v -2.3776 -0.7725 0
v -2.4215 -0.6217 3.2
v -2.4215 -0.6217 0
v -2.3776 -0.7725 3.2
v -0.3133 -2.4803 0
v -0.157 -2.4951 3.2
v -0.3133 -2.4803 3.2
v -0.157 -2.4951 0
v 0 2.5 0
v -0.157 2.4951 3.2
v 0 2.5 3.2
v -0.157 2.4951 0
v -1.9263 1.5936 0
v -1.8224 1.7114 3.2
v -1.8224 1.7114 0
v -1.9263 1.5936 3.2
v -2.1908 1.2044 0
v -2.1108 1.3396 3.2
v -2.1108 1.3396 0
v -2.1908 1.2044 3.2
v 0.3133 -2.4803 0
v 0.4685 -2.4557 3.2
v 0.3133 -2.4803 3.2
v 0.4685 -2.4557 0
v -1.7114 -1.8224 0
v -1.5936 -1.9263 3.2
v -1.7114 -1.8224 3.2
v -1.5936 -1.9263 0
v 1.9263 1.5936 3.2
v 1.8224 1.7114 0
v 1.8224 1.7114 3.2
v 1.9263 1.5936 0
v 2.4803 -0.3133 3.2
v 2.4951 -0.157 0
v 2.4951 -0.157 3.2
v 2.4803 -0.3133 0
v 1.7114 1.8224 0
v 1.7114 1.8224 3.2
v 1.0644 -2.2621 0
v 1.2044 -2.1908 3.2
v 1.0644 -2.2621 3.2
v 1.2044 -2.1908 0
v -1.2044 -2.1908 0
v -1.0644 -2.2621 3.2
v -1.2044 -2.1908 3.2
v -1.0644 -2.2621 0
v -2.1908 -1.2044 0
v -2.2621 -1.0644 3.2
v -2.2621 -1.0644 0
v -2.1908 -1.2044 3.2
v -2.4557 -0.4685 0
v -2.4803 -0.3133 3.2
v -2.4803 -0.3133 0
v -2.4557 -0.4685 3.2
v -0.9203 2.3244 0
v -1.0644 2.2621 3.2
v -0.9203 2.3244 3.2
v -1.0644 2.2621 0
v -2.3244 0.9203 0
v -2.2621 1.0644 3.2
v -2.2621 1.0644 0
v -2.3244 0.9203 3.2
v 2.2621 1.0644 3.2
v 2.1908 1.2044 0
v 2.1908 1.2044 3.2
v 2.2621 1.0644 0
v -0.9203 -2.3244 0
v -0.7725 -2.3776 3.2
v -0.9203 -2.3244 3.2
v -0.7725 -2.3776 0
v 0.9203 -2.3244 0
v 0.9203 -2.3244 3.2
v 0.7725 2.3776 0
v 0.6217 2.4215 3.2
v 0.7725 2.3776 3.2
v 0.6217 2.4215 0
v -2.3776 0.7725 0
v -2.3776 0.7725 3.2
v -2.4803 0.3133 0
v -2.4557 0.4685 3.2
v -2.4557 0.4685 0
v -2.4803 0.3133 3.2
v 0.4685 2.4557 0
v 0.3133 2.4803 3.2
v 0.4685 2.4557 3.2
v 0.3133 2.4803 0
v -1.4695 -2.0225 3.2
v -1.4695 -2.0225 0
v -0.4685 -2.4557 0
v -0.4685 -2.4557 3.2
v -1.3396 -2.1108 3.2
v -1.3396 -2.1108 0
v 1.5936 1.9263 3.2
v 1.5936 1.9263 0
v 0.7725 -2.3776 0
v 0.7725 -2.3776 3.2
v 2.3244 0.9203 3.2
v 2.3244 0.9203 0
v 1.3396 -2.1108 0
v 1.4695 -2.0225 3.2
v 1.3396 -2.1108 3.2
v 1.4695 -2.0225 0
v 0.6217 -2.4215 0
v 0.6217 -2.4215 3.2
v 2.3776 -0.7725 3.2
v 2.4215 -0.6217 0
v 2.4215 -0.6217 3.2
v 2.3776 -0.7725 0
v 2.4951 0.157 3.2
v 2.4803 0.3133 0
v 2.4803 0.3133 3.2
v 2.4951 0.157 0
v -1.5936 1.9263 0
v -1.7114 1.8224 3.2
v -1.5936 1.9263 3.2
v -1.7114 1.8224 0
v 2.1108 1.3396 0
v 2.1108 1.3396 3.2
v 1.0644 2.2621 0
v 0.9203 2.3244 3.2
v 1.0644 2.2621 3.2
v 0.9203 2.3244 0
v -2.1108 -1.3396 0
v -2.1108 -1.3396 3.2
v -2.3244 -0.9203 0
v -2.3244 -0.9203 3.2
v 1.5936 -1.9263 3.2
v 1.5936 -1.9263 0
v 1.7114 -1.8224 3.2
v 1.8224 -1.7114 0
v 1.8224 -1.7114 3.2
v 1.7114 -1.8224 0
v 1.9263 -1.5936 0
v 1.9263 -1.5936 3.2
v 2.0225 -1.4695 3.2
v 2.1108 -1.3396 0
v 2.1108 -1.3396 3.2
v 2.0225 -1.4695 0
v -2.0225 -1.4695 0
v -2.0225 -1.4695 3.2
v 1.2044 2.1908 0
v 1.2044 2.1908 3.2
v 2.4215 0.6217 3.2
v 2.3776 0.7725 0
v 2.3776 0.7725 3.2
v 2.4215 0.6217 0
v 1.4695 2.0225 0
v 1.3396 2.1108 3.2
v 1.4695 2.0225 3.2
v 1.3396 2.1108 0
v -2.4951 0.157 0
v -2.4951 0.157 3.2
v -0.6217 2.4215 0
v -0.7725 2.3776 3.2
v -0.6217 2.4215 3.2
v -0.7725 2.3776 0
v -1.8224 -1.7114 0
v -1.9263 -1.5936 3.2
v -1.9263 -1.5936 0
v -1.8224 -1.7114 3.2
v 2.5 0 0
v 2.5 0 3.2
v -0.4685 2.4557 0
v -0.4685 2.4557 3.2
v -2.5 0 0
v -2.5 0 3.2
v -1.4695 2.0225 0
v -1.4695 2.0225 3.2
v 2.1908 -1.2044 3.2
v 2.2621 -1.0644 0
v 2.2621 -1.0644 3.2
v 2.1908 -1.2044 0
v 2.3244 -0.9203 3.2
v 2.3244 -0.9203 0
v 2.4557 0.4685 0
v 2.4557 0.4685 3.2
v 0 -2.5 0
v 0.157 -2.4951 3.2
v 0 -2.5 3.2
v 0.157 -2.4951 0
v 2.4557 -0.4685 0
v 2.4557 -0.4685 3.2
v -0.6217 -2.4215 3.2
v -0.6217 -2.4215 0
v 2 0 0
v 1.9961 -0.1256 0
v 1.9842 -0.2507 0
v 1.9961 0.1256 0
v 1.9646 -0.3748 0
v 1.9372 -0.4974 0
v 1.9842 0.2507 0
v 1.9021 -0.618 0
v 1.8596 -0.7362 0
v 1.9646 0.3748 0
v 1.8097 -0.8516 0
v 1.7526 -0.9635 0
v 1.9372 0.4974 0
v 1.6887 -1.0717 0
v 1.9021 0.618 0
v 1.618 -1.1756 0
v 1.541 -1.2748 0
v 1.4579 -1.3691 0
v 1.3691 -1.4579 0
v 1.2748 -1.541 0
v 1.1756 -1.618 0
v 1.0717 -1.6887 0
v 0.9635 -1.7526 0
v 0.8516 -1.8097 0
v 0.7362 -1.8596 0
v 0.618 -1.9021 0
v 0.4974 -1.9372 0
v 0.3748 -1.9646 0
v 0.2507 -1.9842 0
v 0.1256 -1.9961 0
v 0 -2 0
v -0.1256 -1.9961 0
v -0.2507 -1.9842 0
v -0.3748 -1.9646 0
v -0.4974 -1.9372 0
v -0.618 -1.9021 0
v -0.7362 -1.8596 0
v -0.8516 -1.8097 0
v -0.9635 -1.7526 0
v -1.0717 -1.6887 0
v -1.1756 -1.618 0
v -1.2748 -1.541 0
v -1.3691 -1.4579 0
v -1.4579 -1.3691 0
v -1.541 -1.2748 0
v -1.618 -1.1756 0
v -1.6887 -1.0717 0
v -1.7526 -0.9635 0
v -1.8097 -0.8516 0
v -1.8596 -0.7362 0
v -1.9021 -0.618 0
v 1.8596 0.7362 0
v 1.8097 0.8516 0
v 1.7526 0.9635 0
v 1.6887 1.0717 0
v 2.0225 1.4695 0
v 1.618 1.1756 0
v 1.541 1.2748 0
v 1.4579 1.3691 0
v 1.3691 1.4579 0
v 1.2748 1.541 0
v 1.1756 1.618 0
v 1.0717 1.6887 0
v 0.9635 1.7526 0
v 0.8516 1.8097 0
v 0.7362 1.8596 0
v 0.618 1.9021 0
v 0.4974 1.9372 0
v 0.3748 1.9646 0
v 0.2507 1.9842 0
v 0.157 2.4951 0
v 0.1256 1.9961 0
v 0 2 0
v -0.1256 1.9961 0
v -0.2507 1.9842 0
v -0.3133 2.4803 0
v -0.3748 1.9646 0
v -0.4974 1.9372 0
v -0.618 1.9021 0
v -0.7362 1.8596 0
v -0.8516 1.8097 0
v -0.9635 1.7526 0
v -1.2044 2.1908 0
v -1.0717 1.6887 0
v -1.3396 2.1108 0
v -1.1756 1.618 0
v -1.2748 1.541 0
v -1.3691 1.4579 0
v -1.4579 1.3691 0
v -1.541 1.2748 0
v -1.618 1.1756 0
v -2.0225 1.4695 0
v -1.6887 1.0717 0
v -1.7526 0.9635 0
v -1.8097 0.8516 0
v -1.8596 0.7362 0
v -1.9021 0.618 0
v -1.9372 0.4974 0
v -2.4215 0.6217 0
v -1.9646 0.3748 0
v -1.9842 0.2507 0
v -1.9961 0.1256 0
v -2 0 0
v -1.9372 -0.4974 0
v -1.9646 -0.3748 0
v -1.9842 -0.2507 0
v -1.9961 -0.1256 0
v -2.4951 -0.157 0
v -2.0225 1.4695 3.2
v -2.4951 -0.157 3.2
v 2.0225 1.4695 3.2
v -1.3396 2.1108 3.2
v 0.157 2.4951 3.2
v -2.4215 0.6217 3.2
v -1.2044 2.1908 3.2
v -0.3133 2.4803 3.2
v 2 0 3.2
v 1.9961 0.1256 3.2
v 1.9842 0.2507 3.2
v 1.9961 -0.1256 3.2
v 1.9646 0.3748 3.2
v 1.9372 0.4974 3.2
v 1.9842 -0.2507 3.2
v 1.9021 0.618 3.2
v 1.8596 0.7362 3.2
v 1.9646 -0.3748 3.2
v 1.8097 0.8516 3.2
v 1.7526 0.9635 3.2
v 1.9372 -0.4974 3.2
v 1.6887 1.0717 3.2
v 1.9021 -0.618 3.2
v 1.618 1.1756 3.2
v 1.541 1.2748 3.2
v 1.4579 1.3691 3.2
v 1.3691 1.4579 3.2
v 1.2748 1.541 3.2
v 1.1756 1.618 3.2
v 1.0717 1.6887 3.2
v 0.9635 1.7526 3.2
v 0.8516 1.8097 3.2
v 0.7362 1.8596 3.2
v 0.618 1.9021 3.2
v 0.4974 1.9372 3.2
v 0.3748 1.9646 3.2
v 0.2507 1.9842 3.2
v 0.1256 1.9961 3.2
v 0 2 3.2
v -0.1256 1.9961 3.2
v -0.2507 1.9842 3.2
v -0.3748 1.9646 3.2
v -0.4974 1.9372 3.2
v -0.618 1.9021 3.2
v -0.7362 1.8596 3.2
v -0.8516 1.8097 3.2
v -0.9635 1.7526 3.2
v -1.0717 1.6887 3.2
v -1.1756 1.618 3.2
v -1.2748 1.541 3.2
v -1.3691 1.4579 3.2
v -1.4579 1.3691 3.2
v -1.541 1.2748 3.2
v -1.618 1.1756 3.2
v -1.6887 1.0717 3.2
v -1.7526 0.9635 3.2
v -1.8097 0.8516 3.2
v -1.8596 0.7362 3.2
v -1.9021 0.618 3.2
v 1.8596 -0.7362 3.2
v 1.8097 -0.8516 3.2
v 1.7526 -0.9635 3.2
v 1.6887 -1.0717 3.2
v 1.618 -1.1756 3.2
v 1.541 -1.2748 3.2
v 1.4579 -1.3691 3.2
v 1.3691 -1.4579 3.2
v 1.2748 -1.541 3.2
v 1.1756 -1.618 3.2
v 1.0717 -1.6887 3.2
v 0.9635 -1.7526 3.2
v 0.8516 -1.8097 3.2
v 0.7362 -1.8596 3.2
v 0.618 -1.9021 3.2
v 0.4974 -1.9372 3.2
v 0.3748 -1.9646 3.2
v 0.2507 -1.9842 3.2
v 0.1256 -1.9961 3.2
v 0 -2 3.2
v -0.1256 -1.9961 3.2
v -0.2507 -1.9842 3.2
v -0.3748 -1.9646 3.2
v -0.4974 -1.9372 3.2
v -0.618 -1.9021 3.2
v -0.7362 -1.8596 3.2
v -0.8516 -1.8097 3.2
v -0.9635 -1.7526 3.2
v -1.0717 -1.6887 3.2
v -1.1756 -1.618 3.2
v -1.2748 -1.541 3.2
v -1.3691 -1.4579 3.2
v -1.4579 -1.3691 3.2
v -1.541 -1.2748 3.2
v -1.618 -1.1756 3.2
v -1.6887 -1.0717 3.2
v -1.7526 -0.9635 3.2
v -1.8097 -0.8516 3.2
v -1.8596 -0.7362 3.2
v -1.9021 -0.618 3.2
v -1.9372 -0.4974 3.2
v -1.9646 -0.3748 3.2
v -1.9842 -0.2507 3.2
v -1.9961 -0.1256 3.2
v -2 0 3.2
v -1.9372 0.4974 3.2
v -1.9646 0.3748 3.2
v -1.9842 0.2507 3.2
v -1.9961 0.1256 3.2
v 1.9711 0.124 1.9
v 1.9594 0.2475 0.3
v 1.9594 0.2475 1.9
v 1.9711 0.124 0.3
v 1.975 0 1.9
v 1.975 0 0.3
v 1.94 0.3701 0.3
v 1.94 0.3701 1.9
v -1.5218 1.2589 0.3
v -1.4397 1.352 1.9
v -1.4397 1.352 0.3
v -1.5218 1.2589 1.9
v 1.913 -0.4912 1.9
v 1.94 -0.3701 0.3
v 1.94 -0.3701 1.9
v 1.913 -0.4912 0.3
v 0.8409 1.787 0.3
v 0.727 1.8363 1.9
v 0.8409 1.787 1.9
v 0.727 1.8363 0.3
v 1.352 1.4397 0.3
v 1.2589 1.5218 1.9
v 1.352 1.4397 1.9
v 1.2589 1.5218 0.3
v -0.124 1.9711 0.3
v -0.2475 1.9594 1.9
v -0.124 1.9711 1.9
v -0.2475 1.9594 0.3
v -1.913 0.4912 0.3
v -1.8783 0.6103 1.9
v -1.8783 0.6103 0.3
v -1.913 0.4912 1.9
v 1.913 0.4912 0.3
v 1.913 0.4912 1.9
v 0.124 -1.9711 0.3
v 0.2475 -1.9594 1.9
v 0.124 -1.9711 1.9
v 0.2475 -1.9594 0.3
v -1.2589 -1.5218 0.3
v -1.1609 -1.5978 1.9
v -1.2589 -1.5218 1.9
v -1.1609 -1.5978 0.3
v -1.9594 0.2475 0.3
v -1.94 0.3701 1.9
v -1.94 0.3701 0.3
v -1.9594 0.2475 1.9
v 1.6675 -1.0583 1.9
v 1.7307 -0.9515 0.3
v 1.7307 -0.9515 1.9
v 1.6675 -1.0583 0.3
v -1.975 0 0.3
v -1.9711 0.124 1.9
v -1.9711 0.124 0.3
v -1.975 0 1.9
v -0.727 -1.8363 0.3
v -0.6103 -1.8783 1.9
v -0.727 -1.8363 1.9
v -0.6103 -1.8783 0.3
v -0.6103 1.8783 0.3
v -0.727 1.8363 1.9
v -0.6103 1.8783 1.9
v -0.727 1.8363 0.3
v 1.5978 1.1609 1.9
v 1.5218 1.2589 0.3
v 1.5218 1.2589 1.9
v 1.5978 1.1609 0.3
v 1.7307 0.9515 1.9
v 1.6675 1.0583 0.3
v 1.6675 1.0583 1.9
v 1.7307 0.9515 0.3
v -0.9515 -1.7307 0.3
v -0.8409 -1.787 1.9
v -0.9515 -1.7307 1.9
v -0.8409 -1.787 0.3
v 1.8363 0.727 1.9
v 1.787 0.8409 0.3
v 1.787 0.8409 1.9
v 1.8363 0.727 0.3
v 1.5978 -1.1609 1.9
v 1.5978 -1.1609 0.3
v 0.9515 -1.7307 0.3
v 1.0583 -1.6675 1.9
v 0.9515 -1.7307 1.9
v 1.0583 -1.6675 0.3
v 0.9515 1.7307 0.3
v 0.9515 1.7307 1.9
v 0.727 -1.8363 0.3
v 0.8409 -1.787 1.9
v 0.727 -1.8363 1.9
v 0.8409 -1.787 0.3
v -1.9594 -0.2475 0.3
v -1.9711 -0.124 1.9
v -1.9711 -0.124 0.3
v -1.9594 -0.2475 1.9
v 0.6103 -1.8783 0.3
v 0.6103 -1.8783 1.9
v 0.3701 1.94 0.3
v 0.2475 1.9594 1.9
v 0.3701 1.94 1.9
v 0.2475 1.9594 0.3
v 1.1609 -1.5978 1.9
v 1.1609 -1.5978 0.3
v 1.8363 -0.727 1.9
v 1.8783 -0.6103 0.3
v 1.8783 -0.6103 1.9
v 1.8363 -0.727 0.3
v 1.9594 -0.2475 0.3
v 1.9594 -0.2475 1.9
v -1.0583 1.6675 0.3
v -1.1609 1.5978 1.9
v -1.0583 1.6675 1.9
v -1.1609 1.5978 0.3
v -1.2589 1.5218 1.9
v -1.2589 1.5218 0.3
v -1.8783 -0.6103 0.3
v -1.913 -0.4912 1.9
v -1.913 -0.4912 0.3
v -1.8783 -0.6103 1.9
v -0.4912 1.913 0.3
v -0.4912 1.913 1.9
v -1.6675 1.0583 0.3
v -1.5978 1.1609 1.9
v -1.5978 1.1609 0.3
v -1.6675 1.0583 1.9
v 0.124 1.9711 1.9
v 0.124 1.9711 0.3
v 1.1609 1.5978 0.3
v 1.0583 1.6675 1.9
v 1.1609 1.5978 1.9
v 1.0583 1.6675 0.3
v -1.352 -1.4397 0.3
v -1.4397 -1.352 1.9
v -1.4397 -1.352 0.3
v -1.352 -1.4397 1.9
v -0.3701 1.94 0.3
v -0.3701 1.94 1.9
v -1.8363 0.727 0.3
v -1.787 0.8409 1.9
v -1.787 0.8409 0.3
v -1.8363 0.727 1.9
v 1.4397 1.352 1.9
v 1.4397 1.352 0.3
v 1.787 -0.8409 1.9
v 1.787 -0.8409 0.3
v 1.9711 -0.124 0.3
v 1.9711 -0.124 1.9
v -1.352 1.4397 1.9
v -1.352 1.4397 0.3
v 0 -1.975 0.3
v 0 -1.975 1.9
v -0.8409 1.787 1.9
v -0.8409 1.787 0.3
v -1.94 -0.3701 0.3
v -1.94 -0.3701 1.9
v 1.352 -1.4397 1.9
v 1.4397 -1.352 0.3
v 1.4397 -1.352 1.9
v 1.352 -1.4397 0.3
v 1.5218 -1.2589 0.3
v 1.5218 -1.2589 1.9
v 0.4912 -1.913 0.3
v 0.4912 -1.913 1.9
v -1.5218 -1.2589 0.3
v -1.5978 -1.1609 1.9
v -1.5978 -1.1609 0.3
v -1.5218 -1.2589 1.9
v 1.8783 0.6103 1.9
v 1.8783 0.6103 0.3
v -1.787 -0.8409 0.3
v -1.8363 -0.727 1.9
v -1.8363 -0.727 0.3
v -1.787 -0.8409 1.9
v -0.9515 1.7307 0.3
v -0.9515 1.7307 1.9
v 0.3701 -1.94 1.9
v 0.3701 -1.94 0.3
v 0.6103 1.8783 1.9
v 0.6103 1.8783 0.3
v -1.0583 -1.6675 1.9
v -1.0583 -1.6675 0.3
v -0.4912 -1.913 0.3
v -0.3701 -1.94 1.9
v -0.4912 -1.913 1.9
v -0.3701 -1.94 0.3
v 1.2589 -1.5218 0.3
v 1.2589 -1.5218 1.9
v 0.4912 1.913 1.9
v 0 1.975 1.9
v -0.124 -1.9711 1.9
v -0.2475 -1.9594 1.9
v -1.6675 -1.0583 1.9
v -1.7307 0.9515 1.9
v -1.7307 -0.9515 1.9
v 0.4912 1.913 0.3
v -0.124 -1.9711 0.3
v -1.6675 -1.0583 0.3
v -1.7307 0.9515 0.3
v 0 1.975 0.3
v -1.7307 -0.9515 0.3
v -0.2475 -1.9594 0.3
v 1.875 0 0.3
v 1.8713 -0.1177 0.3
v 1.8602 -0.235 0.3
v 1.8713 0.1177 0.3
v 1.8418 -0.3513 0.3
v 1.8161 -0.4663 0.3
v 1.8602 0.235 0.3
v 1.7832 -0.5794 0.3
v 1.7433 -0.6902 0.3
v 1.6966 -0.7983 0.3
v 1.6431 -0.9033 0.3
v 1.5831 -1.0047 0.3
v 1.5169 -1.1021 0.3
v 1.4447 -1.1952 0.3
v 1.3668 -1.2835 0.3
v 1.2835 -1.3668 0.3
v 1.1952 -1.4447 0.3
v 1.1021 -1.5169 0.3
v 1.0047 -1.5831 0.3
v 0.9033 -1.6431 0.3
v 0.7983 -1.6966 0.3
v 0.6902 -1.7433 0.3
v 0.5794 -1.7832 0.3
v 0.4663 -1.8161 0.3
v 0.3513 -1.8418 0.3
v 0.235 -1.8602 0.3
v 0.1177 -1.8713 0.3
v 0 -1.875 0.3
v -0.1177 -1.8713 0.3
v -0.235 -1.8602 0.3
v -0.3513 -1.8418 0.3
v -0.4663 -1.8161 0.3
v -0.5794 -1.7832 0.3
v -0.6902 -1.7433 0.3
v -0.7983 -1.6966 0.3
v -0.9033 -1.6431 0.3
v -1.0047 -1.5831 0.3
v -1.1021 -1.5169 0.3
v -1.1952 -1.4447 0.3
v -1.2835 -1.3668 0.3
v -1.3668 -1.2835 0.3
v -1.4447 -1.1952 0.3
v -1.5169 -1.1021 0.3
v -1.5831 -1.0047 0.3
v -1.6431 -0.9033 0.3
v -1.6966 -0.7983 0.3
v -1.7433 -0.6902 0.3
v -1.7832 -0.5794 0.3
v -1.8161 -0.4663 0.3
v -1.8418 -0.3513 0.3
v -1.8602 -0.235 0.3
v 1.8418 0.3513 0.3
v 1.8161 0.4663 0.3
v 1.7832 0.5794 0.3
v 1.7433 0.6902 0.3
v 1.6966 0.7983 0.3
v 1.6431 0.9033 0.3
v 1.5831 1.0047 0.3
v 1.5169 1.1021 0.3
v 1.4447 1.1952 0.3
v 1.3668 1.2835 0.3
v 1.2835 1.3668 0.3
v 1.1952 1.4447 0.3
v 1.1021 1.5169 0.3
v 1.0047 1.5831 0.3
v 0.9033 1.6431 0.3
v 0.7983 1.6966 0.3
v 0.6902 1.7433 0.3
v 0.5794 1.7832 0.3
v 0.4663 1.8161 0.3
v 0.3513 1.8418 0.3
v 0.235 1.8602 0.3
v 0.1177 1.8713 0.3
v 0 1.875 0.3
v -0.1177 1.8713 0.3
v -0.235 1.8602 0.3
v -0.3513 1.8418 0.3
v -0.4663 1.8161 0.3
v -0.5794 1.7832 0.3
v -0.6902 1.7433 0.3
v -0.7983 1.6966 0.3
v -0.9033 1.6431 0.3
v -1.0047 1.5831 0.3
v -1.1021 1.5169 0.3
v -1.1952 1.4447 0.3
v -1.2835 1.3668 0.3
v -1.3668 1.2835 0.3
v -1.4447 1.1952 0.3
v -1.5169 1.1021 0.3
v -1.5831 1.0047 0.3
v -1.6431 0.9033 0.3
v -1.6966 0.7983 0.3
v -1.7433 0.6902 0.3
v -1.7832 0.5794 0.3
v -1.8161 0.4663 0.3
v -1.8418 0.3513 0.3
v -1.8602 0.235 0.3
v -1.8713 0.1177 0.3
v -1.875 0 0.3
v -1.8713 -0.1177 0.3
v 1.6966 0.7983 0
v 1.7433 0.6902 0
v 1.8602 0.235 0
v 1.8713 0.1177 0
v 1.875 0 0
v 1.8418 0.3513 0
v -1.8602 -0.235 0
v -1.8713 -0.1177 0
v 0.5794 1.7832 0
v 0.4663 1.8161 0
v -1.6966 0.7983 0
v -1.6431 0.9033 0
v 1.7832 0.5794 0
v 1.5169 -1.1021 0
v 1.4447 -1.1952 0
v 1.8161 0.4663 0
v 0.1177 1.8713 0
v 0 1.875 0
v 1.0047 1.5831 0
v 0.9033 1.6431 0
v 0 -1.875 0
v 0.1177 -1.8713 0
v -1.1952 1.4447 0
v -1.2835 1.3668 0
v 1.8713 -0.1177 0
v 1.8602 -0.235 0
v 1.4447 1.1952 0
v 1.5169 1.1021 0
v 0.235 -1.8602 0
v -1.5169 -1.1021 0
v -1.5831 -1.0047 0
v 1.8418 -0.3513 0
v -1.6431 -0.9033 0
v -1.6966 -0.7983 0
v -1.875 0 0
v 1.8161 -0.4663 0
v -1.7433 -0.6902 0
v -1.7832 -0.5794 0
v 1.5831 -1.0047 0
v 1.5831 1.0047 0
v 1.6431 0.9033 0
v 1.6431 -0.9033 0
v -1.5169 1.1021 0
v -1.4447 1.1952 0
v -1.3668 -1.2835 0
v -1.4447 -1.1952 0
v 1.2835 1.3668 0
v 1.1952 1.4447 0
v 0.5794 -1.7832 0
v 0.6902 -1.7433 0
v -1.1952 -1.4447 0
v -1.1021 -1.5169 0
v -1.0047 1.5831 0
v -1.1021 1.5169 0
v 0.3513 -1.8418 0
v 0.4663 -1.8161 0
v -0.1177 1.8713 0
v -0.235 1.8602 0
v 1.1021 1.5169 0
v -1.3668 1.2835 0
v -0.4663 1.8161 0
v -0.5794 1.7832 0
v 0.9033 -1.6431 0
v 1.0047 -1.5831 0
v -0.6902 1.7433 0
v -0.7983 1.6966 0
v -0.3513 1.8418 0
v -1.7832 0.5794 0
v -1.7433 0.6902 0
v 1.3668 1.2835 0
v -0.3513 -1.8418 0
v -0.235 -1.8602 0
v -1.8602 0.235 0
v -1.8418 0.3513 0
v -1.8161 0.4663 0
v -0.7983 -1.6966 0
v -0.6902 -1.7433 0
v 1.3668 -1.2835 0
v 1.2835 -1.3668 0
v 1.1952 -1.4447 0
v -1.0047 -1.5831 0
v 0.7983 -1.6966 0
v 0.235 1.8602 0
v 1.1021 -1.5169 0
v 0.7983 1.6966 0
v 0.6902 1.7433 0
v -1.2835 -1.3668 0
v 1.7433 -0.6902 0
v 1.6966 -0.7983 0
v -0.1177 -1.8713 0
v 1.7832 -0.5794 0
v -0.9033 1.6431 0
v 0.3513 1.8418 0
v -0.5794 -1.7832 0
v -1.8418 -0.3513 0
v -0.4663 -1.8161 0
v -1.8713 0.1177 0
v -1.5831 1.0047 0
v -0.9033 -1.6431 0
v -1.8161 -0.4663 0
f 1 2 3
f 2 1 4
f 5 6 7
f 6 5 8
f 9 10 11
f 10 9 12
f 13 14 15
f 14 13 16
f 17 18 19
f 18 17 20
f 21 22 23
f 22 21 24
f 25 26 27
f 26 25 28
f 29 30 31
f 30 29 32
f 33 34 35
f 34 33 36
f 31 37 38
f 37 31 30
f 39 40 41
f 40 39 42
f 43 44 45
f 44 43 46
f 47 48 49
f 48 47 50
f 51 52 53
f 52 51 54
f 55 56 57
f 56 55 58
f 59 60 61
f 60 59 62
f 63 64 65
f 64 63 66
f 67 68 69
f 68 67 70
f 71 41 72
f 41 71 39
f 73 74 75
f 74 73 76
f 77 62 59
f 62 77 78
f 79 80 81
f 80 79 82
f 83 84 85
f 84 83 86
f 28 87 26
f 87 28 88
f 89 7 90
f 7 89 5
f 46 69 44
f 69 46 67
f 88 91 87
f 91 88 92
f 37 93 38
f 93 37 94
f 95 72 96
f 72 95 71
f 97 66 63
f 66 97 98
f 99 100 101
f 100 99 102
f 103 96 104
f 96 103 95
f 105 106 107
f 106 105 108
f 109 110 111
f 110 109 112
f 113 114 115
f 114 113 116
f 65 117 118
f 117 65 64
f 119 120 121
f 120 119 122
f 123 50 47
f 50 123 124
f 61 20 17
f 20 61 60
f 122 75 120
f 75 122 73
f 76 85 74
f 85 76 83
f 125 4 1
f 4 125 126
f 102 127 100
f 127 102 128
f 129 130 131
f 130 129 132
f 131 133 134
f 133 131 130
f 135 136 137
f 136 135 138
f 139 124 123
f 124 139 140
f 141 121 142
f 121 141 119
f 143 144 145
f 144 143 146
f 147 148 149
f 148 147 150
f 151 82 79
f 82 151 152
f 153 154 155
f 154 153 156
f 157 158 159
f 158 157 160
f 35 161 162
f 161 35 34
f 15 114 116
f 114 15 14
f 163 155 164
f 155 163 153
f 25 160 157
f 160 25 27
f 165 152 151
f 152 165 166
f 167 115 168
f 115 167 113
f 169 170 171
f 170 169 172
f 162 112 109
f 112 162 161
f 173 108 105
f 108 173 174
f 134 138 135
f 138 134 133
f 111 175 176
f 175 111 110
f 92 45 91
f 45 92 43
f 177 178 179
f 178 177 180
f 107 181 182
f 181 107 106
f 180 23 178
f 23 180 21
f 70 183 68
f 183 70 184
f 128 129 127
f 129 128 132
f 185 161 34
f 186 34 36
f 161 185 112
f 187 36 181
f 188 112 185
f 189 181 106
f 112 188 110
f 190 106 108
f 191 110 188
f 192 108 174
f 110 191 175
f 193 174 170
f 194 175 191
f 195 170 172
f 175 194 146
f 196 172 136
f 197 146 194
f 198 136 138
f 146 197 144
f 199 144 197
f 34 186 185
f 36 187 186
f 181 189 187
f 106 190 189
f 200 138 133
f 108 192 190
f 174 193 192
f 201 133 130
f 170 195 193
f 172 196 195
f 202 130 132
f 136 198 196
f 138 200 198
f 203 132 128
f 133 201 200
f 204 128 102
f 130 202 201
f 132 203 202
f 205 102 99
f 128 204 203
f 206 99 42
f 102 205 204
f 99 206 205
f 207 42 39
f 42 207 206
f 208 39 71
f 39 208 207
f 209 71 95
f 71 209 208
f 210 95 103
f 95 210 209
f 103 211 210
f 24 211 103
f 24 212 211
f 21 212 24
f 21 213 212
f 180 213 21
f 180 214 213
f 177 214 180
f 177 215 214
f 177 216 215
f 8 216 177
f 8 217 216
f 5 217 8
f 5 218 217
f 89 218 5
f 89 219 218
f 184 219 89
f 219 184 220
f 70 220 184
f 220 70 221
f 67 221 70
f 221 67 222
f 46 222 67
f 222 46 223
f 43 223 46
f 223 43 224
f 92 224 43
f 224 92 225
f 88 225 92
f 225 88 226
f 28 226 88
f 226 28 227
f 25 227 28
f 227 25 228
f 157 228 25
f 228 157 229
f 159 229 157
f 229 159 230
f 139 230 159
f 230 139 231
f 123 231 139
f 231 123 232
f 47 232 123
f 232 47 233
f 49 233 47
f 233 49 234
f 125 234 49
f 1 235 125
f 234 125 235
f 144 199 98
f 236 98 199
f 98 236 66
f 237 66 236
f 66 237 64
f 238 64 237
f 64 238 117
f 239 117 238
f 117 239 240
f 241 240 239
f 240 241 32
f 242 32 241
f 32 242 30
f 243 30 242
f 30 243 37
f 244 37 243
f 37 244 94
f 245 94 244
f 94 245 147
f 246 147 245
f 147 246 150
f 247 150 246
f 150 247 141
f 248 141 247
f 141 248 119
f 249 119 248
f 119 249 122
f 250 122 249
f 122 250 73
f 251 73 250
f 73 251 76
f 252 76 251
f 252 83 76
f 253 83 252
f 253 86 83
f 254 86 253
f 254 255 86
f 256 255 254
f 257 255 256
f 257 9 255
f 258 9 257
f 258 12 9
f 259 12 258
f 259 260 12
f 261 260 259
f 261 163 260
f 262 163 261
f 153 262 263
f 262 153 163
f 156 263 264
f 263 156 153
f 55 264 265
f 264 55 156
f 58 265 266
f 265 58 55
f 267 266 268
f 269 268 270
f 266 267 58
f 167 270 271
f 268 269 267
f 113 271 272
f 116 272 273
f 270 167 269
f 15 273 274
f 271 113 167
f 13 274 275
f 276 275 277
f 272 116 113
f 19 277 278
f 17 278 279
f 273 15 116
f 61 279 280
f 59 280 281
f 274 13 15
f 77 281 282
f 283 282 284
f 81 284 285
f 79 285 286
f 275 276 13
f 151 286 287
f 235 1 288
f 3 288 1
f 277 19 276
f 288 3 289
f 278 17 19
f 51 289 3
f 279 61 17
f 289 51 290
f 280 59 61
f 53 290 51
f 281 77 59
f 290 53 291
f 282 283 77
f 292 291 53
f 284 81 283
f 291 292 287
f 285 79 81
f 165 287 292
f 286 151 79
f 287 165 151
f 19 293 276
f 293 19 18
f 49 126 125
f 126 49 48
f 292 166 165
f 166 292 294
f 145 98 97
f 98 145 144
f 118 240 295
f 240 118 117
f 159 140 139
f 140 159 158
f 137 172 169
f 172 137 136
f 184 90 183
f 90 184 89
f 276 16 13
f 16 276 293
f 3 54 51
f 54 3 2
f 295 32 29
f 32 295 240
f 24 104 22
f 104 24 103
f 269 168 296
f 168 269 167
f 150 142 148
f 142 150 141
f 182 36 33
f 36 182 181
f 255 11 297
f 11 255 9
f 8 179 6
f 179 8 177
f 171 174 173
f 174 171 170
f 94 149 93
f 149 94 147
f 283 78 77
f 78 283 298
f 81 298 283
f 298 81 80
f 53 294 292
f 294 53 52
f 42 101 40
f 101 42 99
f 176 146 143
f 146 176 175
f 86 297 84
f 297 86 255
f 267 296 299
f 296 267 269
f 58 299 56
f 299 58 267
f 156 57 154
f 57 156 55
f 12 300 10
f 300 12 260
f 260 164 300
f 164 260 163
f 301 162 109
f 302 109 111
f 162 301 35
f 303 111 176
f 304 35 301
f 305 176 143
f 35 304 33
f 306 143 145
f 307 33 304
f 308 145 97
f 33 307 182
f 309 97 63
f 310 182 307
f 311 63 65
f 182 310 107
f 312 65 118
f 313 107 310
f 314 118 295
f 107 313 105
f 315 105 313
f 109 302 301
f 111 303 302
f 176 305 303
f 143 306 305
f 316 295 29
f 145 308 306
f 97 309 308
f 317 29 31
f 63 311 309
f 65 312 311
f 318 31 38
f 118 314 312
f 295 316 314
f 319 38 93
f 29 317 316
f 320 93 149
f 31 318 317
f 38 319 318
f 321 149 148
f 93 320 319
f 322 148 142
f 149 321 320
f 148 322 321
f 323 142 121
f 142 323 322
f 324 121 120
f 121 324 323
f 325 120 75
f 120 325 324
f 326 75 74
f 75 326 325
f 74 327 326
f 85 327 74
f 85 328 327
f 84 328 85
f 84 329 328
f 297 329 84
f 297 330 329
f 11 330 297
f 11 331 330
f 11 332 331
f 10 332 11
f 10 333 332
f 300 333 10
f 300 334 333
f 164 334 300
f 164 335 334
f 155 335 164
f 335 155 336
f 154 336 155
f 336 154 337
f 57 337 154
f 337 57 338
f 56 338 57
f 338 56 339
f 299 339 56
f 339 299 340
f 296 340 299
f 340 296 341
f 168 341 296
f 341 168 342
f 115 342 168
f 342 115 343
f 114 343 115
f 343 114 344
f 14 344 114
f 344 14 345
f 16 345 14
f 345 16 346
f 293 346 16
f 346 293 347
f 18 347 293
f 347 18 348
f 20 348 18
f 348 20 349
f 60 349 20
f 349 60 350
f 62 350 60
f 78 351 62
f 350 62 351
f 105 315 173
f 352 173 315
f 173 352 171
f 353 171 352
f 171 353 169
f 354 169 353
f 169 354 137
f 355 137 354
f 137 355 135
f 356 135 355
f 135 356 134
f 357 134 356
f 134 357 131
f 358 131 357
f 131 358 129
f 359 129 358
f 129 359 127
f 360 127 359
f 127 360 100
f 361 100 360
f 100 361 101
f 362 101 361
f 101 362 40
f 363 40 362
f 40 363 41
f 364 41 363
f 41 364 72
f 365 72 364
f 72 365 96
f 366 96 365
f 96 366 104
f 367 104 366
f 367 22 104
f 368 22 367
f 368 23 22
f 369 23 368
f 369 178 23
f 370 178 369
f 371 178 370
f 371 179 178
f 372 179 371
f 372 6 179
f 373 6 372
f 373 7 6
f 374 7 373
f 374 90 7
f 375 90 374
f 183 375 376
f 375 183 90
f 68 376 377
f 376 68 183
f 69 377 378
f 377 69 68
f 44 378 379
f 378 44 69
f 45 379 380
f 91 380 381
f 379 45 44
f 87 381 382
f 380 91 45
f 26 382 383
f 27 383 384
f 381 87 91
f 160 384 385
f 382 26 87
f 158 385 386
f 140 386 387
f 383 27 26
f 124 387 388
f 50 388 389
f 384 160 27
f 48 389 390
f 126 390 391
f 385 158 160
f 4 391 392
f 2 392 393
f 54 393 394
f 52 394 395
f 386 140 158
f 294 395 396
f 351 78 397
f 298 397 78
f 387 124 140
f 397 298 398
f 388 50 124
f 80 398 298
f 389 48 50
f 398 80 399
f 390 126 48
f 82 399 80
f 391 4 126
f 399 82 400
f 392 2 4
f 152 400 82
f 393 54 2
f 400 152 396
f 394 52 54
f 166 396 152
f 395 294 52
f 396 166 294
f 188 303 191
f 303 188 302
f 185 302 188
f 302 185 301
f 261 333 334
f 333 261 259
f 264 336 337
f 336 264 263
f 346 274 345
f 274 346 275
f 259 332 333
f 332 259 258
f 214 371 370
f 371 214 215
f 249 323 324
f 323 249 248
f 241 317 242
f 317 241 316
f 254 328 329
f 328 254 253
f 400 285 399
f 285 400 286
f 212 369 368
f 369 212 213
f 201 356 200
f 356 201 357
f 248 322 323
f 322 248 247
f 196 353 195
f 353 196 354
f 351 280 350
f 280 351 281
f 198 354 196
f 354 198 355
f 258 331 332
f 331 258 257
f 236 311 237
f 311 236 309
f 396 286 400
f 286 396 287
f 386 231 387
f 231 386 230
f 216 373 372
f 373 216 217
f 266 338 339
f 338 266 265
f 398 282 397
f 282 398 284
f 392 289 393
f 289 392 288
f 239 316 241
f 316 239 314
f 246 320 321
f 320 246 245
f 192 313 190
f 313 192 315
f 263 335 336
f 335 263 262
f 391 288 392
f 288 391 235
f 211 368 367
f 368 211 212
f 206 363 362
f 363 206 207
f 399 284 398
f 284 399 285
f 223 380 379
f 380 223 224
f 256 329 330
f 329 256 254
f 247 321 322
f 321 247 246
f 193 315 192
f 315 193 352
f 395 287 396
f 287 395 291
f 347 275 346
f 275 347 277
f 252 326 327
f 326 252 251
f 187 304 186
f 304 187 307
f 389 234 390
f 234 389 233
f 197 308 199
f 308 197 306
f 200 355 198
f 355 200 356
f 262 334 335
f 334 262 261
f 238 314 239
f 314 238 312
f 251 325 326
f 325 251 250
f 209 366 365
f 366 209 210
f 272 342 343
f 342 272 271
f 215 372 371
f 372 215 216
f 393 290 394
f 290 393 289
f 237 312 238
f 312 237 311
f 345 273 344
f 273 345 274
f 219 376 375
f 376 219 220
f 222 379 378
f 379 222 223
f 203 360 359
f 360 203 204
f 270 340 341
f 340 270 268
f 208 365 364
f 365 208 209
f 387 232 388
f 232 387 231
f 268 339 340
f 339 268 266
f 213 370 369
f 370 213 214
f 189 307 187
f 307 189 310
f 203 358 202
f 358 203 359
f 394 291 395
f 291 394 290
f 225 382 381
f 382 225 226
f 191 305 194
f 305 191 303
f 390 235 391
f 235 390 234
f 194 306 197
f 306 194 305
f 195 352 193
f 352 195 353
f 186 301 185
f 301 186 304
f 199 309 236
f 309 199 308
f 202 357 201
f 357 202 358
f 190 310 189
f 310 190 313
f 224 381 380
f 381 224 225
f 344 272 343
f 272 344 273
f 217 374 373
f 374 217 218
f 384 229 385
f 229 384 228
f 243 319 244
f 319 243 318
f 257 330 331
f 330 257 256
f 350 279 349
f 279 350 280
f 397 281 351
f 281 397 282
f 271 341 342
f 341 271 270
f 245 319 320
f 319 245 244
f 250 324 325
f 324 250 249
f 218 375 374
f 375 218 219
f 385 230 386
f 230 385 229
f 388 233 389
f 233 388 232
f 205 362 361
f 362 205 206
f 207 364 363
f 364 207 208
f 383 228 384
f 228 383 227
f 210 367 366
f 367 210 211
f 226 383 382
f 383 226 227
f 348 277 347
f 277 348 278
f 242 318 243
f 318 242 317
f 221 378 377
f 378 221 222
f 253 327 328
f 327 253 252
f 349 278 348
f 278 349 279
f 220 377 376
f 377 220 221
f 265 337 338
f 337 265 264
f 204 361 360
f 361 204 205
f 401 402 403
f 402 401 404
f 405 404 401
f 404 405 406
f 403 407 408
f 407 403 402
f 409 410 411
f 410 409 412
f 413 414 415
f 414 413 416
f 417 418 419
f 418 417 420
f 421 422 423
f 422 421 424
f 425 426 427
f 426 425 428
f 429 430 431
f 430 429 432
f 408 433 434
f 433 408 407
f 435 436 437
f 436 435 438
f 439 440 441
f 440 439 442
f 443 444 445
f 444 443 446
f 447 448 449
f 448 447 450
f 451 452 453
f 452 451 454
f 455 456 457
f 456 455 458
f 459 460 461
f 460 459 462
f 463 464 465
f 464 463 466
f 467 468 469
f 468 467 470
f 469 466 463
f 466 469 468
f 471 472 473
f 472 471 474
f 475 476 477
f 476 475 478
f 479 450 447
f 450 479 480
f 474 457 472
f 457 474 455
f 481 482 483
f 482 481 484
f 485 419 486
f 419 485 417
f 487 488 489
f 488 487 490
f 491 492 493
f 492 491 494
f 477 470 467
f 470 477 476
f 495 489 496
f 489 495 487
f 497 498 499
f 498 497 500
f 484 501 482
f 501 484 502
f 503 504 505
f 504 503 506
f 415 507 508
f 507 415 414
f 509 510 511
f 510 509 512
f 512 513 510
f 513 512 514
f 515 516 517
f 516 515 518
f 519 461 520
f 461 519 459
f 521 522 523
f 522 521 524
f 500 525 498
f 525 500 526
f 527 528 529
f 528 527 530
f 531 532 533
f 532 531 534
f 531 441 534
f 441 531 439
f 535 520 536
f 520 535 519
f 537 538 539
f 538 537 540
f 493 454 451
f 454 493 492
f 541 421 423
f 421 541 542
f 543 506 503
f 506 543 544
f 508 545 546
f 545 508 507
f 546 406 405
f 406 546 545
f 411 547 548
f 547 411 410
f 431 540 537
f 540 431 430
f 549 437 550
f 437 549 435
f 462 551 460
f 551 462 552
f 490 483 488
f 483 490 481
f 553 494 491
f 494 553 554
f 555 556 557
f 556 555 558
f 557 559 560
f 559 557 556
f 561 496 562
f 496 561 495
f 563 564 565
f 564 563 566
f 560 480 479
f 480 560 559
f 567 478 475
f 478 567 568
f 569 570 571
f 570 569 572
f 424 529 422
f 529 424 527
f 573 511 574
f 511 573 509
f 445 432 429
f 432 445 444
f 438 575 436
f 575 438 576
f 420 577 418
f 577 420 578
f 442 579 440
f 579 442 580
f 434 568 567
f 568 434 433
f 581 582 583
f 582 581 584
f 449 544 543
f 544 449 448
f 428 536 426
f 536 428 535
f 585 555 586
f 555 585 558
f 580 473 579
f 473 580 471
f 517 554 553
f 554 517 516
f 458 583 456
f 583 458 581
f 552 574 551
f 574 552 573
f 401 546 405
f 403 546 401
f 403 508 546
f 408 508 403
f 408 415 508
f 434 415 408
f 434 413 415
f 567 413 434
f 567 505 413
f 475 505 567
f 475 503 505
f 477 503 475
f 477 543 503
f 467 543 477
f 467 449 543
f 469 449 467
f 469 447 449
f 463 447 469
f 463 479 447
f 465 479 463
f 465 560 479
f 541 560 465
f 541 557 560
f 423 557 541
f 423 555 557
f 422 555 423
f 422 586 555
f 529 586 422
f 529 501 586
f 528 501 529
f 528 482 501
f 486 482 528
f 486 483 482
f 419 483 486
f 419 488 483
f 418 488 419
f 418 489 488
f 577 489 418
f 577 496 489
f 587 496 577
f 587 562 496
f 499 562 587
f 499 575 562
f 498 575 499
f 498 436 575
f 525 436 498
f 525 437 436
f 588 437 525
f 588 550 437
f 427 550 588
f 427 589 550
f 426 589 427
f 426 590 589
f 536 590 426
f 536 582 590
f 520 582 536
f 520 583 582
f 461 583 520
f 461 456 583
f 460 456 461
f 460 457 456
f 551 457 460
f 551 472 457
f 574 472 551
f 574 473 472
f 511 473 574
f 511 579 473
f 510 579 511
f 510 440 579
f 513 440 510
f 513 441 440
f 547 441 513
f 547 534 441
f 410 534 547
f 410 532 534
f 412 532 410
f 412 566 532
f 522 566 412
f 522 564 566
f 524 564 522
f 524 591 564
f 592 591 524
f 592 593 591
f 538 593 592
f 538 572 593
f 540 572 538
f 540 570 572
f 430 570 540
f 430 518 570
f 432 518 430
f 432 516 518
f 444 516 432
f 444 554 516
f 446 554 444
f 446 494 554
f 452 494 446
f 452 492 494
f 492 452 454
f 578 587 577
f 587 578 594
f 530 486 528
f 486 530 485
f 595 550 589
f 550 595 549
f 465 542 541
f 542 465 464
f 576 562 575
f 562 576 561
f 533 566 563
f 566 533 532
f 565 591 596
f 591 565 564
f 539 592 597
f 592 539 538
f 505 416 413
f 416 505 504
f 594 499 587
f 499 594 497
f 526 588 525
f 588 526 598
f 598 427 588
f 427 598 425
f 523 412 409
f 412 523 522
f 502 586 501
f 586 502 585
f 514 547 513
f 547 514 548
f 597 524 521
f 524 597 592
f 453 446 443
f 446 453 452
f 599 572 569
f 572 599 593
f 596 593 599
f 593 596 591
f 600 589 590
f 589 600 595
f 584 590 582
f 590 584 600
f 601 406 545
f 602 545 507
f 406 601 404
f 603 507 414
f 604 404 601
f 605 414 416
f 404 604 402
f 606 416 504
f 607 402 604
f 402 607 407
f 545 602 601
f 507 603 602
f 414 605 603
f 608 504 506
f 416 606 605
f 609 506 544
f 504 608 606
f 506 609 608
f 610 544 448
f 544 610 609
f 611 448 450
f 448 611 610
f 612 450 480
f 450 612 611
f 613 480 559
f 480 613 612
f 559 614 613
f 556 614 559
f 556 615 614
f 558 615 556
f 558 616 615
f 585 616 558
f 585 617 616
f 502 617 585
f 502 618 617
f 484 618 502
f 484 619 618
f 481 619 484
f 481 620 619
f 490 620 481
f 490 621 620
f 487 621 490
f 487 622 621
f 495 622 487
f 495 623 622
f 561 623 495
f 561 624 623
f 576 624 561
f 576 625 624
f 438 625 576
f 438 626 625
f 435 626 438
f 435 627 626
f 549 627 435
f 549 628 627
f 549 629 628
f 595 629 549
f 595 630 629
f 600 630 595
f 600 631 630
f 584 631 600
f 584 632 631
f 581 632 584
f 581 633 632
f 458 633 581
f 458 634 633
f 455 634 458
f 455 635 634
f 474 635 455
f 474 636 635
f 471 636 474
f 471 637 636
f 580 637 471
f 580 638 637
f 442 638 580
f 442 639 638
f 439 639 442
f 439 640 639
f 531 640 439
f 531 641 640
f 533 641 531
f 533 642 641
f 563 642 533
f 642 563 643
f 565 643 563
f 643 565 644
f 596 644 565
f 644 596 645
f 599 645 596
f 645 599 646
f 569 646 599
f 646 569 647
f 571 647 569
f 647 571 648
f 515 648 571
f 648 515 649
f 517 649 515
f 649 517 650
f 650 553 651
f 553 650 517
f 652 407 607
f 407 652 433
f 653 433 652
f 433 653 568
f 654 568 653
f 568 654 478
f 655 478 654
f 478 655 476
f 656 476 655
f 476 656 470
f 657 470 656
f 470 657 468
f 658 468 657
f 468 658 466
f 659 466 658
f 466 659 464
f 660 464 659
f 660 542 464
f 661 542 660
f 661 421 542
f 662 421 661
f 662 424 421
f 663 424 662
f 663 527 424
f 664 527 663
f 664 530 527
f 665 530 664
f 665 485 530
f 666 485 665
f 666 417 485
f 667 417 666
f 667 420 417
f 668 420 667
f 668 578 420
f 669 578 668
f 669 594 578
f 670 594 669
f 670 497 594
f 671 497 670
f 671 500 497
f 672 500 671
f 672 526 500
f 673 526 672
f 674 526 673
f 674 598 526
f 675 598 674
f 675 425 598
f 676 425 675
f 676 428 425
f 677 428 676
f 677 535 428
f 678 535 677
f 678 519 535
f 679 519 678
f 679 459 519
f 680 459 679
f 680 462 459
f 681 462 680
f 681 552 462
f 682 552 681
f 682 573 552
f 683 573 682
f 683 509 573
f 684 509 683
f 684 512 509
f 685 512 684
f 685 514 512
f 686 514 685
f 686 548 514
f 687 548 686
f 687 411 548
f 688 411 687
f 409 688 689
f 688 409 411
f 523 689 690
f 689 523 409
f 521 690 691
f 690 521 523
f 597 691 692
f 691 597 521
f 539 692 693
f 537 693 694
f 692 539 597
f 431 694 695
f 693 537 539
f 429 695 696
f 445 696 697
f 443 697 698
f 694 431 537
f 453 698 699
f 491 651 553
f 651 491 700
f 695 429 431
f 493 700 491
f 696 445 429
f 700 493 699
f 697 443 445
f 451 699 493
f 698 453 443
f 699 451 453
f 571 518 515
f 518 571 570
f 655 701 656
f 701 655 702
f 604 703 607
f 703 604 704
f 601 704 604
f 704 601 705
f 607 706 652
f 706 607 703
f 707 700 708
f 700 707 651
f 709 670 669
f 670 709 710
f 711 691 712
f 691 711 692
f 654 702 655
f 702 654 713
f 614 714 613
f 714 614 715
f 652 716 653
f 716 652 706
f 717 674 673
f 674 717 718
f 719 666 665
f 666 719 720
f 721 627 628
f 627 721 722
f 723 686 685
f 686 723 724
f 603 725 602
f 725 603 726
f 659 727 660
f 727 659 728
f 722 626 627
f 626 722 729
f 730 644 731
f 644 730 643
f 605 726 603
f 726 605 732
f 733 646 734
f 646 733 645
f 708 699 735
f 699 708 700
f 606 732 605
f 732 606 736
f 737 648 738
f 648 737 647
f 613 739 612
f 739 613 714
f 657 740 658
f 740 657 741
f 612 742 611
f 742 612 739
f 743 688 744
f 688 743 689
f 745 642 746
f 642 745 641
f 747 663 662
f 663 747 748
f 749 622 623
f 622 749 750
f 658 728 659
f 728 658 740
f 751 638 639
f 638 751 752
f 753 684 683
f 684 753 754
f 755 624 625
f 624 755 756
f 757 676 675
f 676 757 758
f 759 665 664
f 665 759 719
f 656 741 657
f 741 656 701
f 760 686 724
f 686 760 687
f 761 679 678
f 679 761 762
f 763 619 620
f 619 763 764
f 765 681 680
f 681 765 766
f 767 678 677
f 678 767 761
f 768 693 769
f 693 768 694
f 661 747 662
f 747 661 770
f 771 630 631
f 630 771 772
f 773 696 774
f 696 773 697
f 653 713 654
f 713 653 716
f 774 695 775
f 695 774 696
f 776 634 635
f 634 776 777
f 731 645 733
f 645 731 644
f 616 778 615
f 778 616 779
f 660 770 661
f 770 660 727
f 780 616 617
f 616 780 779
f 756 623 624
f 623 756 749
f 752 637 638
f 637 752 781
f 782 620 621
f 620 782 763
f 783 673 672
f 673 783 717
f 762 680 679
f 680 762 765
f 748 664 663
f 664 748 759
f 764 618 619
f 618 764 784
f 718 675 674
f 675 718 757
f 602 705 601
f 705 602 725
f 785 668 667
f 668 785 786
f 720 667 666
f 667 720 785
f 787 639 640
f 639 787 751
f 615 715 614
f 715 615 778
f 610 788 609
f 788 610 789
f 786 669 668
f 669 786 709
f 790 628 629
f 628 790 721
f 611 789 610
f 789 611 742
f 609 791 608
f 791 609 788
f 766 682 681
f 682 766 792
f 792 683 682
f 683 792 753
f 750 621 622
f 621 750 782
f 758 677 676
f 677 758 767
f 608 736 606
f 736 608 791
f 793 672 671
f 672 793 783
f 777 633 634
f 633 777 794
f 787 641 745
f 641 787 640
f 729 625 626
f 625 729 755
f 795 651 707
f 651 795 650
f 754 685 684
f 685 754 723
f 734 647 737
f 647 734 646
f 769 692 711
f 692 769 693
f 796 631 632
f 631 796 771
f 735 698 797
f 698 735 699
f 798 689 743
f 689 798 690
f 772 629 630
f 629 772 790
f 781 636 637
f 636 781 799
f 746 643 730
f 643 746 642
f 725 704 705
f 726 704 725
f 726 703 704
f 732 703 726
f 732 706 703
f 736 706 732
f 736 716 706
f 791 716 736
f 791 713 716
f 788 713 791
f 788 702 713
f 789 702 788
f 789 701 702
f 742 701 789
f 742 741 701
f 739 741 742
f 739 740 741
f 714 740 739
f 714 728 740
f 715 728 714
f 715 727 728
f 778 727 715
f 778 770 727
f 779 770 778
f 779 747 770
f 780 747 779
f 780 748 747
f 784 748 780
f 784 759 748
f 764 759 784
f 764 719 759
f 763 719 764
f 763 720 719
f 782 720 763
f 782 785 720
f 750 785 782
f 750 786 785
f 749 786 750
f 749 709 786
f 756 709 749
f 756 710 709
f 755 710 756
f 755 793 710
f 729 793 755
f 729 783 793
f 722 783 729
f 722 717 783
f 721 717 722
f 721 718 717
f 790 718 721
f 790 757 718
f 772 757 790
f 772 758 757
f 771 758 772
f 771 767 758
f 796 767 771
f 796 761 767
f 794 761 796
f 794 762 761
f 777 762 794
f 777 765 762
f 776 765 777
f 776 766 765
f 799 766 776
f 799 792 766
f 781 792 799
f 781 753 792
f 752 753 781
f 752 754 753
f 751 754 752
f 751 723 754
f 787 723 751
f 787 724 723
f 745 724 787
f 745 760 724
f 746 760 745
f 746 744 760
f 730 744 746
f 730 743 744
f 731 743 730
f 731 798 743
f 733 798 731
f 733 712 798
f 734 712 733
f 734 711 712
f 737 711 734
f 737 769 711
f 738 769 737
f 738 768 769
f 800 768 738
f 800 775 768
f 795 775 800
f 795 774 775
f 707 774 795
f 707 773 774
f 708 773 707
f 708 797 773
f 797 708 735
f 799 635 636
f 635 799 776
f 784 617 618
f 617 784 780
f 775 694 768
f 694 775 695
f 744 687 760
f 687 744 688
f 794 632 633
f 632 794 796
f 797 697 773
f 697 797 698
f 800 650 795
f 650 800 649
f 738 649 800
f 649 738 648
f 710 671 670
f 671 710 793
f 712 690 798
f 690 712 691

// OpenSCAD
// Design B: Inertial Piston Injector (Pfeil-ähnlich)
// 5mm x 5mm
// Best separation of launch forces vs impact
// Inertia of internal piston forces payload out ONLY on sudden deceleration (impact)

$fn = 100;

outer_dia = 5.0;
total_length = 5.0;

// Key dimensions
nose_length = 1.8;
piston_length = 1.6;
payload_chamber_length = 1.4;
wall = 0.5;
orifice_dia = 0.6;  // Small nozzle for directed ejection

// Outer shell (aerodynamic)
module outer_shell() {
    difference() {
        union() {
            // Ogive nose
            hull() {
                cylinder(h = nose_length * 0.7, d = outer_dia);
                translate([0,0, nose_length * 0.85])
                    cylinder(h = 0.1, d = 0.8);
            }
            
            // Main body
            cylinder(h = total_length - nose_length, d = outer_dia);
        }
        
        // Internal bore for piston and payload
        translate([0, 0, -0.1])
            cylinder(h = total_length + 1, d = outer_dia - 2*wall);
        
        // Small ejection orifice at tip
        translate([0, 0, total_length - nose_length + 0.3])
            cylinder(h = 1.5, d = orifice_dia);
    }
}

// Inertial piston / slug (print with high infill or separate dense material)
module inertial_piston() {
    cylinder(h = piston_length, d = outer_dia - 2.1*wall);
    
    // Optional: Add mass concentration at rear
    translate([0,0, -0.3])
        cylinder(h = 0.5, d = outer_dia - 2.5*wall);
}

// Payload chamber is the space in front of the piston
// The piston is placed behind the payload during assembly

// Shear ring / friction holder (thin ring that holds piston during acceleration)
module shear_ring() {
    difference() {
        cylinder(h = 0.3, d = outer_dia - 1.8*wall);
        cylinder(h = 0.4, d = outer_dia - 2.2*wall);
    }
}

// Assembly instructions in comments
module full_assembly() {
    // Outer shell
    outer_shell();
    
    // Piston positioned at rear (for printing / assembly reference)
    translate([0, 0, 0.3])
        inertial_piston();
}

// Recommended print strategy:
// - Print outer_shell separately
// - Print piston separately (use 100% infill or pause and add metal BB for more mass)
// - Assemble: Put payload in front chamber, insert piston from rear, secure with thin shear ring or friction
// - On launch: All accelerate together
// - On impact: Shell stops, piston continues forward by inertia, ejects payload through orifice

full_assembly();

echo("Design B: Inertial Piston Injector");
echo("Key feature: Pure inertial release on deceleration");
echo("Tip: Make piston heavier than shell for better effect (high infill or insert)");
